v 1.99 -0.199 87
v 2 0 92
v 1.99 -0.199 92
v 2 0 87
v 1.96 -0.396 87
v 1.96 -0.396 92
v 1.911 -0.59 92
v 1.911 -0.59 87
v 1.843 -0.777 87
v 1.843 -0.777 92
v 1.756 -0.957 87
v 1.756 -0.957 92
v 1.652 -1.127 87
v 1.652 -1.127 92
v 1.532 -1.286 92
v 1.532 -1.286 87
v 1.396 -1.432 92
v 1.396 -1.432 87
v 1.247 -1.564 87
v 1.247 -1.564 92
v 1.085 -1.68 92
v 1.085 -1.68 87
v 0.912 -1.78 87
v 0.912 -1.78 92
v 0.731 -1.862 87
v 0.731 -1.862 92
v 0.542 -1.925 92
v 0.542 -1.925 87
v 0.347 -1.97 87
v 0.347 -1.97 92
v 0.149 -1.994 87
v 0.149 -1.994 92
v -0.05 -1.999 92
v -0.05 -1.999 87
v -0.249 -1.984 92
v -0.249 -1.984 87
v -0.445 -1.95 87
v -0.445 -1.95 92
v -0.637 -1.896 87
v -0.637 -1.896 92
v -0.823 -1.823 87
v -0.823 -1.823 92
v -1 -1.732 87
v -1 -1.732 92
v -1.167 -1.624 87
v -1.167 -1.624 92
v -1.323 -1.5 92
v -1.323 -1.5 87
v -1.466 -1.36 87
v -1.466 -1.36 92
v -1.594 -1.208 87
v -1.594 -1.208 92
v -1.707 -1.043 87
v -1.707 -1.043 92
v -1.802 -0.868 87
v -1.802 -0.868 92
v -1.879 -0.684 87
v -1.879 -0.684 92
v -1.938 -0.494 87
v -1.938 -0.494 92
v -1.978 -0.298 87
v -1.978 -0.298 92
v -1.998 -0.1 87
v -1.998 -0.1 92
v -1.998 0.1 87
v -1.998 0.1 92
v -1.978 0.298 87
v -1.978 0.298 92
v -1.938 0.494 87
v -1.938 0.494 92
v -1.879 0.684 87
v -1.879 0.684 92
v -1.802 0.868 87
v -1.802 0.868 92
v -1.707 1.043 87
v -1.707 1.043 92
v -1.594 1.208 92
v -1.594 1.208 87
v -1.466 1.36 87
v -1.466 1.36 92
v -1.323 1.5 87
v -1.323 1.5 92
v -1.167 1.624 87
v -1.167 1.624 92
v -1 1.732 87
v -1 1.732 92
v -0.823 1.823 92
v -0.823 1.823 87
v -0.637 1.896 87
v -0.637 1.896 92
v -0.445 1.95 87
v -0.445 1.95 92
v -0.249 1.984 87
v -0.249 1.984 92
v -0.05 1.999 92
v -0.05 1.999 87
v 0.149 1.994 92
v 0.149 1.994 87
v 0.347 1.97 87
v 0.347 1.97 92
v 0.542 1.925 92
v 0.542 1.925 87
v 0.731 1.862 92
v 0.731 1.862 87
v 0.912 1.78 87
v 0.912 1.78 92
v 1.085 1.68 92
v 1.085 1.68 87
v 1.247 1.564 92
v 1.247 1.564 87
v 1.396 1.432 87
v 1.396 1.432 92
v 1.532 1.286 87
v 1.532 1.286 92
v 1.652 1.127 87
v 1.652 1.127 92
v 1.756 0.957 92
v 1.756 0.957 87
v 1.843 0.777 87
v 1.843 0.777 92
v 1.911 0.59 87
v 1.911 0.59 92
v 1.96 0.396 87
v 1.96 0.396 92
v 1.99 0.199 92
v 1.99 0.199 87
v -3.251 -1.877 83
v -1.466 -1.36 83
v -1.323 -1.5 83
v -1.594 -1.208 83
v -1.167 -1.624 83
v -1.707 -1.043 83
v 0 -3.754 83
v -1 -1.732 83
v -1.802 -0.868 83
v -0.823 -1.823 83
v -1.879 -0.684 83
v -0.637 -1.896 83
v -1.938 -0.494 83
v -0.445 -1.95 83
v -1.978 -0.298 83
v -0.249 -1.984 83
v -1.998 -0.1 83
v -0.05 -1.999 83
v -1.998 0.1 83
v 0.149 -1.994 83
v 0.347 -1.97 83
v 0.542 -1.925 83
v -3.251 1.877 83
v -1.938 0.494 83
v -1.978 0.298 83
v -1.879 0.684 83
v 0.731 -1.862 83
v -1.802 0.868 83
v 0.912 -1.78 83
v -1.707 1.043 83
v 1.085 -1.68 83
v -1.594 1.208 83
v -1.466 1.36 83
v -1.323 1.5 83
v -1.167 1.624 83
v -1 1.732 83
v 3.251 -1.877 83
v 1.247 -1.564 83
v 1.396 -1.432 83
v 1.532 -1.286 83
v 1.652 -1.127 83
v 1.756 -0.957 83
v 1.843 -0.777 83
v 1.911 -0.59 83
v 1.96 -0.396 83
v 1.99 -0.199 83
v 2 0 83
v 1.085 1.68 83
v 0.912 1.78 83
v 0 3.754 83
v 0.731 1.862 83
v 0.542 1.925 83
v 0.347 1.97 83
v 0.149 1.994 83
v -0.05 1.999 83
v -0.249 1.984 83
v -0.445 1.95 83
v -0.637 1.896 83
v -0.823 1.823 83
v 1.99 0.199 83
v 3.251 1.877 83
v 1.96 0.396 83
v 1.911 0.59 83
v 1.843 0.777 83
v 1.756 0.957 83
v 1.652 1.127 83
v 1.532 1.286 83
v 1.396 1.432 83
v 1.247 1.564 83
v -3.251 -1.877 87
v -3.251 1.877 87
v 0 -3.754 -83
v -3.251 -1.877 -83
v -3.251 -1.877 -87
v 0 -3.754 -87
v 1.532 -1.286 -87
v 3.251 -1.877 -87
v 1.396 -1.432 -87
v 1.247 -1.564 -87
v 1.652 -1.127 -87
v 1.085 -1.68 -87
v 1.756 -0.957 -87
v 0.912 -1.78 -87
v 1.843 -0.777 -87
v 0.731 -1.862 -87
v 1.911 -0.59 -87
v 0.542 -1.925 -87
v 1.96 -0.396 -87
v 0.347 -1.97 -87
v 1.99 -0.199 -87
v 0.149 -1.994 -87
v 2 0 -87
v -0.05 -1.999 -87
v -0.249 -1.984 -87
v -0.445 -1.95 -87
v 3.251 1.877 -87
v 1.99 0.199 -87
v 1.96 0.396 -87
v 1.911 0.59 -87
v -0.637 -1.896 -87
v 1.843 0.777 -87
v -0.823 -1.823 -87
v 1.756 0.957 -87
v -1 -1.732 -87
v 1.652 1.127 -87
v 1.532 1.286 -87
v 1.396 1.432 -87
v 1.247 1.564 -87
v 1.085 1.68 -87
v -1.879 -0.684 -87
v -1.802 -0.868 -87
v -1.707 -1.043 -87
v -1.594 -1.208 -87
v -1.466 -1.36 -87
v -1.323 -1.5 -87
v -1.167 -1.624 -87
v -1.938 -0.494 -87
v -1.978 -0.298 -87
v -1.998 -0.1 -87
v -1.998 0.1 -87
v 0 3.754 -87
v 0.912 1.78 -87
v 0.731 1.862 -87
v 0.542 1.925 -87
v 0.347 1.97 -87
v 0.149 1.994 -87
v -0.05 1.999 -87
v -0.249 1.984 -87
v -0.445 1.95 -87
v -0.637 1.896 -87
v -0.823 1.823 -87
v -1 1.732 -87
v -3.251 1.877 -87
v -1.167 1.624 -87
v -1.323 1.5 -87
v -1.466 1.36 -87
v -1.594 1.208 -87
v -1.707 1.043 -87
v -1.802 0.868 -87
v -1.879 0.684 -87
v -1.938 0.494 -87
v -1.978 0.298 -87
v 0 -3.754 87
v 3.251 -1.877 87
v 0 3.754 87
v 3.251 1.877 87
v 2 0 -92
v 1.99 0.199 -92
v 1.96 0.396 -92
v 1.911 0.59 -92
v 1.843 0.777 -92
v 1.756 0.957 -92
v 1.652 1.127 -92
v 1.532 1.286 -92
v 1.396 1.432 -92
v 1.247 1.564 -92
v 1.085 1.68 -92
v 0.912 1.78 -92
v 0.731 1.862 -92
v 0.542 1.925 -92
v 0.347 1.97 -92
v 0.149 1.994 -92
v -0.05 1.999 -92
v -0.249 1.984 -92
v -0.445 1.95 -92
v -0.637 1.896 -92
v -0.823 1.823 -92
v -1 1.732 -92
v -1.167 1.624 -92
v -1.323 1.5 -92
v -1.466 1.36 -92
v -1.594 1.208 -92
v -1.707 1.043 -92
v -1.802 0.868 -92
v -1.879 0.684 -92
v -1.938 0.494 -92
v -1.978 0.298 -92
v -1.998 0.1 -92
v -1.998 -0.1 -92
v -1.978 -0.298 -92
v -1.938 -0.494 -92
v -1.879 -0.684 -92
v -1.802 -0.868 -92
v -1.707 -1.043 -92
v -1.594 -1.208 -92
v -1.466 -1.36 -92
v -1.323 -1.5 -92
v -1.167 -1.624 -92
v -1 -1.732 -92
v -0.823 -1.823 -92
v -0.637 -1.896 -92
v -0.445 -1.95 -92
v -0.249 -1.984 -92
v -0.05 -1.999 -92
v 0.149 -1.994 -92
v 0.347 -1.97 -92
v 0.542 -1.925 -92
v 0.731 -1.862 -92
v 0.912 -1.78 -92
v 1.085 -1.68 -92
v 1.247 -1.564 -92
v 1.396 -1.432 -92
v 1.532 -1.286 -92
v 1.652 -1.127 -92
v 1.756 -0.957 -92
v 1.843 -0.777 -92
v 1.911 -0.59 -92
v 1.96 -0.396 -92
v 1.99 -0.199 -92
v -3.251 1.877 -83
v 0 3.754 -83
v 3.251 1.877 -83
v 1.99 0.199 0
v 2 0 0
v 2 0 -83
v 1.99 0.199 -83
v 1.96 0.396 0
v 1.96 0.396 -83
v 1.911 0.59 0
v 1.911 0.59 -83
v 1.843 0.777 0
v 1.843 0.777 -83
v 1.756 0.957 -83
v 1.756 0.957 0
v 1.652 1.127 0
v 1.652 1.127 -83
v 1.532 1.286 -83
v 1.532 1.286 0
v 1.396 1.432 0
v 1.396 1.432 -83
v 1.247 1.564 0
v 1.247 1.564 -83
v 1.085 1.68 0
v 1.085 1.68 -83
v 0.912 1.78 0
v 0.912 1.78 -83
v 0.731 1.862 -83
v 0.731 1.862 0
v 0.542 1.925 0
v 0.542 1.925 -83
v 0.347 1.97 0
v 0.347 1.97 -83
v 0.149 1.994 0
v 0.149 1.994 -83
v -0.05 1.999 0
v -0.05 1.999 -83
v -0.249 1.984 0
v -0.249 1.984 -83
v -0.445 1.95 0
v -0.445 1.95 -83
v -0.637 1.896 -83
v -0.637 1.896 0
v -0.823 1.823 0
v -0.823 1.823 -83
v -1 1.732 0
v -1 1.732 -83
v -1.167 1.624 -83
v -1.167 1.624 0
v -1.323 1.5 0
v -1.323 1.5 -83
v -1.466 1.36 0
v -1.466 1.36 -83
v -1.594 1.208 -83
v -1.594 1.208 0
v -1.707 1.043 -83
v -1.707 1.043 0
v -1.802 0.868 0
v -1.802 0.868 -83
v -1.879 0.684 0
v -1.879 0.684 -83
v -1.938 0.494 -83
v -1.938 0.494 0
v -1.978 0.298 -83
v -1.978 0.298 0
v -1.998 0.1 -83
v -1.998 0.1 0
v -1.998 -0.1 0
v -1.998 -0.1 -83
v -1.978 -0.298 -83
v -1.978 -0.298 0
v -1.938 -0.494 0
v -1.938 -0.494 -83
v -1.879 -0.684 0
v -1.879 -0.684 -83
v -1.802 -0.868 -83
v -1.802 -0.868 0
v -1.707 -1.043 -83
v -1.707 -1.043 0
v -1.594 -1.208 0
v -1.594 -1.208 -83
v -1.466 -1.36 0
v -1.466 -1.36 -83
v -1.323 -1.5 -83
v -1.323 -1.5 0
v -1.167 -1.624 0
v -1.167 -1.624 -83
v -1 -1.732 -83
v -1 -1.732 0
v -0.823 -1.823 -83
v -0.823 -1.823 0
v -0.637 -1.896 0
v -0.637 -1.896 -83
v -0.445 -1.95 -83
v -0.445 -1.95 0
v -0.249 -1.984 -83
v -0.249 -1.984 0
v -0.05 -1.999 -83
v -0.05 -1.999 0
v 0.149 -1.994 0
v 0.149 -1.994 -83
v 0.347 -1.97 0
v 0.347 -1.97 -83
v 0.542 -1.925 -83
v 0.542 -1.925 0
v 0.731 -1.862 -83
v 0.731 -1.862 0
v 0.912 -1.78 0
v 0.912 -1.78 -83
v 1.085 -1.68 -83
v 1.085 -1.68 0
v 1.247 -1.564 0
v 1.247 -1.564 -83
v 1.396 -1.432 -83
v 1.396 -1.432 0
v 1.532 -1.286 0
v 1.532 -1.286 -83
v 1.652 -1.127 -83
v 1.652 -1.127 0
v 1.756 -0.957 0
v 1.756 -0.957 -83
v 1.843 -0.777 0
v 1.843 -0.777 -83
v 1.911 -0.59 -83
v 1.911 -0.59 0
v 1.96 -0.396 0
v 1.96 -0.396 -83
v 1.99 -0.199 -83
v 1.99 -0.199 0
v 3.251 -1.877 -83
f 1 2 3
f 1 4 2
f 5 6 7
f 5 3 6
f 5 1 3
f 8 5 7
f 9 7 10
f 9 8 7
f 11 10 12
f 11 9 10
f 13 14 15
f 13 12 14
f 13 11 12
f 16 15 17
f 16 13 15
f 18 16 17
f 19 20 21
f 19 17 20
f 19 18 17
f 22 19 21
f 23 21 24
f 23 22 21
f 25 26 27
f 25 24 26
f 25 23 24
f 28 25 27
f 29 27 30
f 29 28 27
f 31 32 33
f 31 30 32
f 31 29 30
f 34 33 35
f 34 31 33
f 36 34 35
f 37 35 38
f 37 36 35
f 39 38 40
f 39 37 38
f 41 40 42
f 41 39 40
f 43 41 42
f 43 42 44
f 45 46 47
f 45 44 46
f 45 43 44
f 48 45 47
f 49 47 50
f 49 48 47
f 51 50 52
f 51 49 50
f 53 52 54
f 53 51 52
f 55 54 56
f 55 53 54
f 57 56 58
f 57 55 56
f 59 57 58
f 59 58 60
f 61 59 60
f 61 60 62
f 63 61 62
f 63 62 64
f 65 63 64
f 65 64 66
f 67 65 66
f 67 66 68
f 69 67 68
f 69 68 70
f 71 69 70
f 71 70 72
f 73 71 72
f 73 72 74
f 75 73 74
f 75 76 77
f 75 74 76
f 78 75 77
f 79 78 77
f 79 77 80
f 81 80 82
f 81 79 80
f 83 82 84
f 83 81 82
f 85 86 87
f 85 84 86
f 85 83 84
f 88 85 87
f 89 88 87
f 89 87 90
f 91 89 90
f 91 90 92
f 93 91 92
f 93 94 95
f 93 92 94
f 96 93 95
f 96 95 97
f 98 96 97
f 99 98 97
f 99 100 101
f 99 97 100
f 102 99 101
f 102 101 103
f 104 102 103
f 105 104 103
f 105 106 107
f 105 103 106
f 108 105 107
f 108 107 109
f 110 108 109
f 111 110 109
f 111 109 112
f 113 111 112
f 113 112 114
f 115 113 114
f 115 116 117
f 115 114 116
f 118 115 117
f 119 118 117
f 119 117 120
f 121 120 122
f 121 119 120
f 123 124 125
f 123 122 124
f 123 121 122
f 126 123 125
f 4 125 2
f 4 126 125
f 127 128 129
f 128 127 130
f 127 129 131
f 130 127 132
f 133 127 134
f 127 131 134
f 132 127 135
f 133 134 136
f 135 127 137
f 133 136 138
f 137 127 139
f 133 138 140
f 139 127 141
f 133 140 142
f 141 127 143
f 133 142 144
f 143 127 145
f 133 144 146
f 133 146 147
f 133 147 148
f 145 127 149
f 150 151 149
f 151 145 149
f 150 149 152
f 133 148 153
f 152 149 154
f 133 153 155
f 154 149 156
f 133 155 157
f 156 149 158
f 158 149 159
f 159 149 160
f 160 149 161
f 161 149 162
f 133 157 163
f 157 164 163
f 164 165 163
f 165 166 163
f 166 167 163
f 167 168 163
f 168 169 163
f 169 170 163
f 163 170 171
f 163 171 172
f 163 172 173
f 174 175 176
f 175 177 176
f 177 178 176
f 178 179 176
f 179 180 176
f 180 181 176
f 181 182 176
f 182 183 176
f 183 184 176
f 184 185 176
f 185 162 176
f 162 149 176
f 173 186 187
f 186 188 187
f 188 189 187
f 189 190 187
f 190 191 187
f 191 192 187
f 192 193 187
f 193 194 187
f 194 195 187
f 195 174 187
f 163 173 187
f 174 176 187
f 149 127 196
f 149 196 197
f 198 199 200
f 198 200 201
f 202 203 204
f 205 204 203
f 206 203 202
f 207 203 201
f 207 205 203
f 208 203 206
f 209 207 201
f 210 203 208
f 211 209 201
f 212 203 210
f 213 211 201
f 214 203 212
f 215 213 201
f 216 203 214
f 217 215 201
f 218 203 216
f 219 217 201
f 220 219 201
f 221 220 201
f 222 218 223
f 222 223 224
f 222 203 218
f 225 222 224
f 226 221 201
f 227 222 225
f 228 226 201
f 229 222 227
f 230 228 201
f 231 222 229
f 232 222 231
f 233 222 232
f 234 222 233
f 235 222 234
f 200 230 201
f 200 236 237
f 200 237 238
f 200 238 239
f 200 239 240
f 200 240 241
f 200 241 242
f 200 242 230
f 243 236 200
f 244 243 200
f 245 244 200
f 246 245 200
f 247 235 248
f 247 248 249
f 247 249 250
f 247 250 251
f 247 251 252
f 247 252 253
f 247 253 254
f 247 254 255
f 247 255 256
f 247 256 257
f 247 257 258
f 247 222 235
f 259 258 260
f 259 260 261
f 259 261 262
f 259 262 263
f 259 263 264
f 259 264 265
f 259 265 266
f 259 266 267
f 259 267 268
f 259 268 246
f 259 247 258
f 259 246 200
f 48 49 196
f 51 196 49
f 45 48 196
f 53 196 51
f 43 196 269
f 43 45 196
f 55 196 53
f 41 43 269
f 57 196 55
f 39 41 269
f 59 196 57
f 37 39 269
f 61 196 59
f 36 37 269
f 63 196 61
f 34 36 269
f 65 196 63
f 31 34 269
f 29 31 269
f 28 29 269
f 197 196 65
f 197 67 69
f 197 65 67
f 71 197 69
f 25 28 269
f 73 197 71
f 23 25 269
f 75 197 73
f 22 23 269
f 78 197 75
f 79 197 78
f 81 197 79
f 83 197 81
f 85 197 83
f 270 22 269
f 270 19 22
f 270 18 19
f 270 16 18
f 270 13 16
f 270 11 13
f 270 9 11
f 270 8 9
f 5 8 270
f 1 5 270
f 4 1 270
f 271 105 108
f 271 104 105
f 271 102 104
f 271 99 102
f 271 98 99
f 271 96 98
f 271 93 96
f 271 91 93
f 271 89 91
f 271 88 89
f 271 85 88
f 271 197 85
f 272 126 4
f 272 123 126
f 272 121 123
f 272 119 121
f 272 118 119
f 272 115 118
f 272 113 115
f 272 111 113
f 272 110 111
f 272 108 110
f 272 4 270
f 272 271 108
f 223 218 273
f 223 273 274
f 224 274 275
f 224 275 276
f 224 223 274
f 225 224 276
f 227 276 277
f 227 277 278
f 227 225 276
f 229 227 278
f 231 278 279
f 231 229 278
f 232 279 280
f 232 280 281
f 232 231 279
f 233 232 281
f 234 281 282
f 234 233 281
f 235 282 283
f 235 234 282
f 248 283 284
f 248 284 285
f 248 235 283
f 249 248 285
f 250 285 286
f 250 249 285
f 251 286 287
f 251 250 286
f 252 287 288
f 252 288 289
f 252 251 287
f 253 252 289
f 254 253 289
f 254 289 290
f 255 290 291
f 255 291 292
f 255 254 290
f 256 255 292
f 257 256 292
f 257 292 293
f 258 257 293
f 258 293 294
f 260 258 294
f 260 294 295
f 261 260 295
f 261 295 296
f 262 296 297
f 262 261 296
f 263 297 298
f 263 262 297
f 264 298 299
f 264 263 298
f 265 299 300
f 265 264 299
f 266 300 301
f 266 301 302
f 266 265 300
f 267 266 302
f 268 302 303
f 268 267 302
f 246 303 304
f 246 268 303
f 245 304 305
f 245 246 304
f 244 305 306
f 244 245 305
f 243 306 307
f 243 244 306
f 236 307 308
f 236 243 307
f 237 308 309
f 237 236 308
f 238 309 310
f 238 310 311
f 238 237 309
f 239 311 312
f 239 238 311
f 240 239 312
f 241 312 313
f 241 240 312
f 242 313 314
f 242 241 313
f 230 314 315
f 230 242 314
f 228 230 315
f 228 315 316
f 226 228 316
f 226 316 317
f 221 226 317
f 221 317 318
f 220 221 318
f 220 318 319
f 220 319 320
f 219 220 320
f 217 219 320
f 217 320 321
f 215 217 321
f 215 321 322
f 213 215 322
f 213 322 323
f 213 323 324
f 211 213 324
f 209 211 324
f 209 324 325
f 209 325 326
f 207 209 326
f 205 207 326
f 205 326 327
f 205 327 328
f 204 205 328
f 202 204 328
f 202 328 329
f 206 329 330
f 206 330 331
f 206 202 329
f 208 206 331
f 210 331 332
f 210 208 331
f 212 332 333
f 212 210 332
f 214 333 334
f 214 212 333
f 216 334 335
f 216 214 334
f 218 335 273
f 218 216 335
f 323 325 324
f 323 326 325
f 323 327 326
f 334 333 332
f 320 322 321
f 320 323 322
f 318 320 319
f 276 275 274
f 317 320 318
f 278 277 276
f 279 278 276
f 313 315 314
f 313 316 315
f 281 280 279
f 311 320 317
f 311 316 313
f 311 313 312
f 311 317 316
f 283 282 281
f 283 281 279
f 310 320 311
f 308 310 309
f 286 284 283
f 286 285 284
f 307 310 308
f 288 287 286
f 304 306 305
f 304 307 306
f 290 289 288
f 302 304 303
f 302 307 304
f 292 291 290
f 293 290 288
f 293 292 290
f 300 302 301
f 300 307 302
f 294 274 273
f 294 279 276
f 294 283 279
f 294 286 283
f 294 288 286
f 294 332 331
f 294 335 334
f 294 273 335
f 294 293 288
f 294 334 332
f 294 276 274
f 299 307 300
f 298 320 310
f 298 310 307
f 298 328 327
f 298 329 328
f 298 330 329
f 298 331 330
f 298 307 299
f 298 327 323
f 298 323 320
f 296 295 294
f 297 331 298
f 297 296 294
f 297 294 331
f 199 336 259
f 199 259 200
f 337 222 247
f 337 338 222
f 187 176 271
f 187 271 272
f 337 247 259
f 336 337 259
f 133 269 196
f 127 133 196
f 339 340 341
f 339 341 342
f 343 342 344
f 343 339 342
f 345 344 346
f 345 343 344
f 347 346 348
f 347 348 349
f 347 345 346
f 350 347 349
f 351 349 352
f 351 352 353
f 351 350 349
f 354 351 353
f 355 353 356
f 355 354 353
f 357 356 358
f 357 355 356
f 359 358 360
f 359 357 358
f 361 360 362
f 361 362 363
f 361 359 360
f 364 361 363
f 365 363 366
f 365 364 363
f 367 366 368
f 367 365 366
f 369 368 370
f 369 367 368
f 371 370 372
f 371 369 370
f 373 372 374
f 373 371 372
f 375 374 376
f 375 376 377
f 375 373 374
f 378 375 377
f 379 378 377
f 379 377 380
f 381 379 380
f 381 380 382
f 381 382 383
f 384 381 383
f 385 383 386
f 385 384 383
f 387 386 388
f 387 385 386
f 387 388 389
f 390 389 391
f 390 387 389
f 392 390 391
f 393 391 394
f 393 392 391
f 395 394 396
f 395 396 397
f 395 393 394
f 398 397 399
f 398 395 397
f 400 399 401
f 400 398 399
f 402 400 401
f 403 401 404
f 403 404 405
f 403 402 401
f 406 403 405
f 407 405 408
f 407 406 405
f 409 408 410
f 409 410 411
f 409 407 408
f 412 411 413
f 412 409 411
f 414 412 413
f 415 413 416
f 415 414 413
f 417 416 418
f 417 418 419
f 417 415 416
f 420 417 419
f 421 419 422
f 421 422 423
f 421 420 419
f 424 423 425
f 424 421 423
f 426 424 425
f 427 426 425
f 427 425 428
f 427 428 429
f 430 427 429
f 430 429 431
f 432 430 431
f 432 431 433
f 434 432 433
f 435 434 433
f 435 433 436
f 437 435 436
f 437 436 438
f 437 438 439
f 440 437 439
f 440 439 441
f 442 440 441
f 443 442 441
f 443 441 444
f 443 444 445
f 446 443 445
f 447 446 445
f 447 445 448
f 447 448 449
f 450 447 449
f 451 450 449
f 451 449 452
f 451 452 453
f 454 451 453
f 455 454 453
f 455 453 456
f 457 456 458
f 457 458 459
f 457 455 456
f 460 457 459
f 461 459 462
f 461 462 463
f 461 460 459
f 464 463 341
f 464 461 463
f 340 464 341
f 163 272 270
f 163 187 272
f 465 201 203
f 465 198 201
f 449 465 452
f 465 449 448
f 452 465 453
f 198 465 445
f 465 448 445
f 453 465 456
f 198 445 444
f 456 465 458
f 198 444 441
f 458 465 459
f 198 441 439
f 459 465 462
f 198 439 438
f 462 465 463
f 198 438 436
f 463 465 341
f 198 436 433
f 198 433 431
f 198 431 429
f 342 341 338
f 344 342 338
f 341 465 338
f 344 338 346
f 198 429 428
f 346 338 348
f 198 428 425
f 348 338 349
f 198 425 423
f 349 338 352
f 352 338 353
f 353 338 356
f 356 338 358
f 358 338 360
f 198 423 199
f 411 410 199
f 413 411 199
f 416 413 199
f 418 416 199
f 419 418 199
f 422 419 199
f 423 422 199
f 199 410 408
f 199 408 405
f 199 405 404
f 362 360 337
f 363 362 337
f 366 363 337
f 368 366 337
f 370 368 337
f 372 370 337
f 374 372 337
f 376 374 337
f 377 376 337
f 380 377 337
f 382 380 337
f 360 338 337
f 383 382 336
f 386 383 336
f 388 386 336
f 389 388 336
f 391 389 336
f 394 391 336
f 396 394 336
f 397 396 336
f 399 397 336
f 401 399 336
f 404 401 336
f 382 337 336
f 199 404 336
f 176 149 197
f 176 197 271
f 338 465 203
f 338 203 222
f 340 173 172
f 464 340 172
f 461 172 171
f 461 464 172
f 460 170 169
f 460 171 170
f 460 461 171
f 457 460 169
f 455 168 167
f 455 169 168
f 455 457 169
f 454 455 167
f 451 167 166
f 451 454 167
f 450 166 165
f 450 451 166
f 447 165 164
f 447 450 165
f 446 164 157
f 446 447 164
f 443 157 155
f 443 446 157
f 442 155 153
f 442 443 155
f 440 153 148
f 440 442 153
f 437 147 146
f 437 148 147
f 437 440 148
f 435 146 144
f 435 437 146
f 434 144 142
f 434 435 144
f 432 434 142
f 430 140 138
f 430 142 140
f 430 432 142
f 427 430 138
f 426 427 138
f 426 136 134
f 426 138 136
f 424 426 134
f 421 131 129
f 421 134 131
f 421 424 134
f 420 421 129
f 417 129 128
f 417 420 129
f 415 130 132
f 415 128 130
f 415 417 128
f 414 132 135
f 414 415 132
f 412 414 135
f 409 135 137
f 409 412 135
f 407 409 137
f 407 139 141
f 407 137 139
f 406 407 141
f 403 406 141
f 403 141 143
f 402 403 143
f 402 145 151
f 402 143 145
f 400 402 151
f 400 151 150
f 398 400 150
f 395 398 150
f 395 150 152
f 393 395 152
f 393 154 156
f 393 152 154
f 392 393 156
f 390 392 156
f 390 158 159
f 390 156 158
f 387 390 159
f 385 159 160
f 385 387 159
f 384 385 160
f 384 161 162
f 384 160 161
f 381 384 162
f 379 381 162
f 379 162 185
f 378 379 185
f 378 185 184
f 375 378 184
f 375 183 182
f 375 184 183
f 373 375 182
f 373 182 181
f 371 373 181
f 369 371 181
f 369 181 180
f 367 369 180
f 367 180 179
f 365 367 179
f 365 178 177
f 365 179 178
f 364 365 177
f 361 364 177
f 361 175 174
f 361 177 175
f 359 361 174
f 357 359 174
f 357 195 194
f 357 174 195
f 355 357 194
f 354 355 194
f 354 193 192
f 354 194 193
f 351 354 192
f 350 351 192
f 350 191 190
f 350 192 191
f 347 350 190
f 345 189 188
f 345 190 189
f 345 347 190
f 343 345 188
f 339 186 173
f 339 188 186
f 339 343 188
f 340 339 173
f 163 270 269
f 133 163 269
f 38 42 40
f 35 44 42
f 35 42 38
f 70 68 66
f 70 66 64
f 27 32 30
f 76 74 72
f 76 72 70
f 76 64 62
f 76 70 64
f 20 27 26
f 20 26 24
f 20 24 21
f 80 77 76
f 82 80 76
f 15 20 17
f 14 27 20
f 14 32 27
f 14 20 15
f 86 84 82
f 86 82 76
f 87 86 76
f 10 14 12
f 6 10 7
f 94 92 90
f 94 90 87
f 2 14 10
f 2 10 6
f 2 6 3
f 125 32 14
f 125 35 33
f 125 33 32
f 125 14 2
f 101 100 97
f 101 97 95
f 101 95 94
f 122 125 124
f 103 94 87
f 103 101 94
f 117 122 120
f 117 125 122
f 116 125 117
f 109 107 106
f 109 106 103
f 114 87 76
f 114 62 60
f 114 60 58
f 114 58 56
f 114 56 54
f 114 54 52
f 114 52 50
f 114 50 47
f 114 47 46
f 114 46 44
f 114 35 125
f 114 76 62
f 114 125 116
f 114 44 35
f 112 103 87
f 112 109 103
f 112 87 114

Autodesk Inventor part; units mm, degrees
ref_plane "YZ Plane" through (0, 0, 0) normal (1, 0, 0) x (0, 1, 0)
ref_plane "XZ Plane" through (0, 0, 0) normal (0, 1, 0) x (-1, 0, 0)
ref_plane "XY Plane" through (0, 0, 0) normal (0, 0, 1) x (1, 0, 0)
sketch "Эскиз1" plane through (0, 0, 0) normal (0, 0, 1) x (1, 0, 0)
  circle A0 centre (0, 0) radius 2
  dimension "d0" = 4
extrude "Выдавливание1" add sketch "Эскиз1" along normal blind 83
sketch "Эскиз2" plane through (0, 0, 83) normal (0, 0, 1) x (1, 0, 0)
  line L0 (0, 3.7538) -> (3.2509, 1.8769)
  line L1 (3.2509, 1.8769) -> (3.2509, -1.8769)
  line L2 (3.2509, -1.8769) -> (0, -3.7538)
  line L3 (0, -3.7538) -> (-3.2509, -1.8769)
  line L4 (-3.2509, -1.8769) -> (-3.2509, 1.8769)
  line L5 (-3.2509, 1.8769) -> (0, 3.7538)
  point P0 (0, 0)
  point P1 (0, 0)
extrude "Выдавливание2" add sketch "Эскиз2" along normal blind 4
sketch "Эскиз3" plane through (0, 0, 87) normal (0, 0, 1) x (1, 0, 0)
  circle A0 centre (0, 0) radius 2 projected
  circle A1 centre (0, 0) radius 2
extrude "Выдавливание3" add sketch "Эскиз3" along normal blind 5
thread "Резьба1" size "M4x0.7" class "6g" standard "ANSI Metric M Profile" full length
mirror "Зеркальное отражение1" about plane through (0, 0, 0) normal (0, 0, -1)
properties part number "ось пушки 2" material "Сталь, литейная"
